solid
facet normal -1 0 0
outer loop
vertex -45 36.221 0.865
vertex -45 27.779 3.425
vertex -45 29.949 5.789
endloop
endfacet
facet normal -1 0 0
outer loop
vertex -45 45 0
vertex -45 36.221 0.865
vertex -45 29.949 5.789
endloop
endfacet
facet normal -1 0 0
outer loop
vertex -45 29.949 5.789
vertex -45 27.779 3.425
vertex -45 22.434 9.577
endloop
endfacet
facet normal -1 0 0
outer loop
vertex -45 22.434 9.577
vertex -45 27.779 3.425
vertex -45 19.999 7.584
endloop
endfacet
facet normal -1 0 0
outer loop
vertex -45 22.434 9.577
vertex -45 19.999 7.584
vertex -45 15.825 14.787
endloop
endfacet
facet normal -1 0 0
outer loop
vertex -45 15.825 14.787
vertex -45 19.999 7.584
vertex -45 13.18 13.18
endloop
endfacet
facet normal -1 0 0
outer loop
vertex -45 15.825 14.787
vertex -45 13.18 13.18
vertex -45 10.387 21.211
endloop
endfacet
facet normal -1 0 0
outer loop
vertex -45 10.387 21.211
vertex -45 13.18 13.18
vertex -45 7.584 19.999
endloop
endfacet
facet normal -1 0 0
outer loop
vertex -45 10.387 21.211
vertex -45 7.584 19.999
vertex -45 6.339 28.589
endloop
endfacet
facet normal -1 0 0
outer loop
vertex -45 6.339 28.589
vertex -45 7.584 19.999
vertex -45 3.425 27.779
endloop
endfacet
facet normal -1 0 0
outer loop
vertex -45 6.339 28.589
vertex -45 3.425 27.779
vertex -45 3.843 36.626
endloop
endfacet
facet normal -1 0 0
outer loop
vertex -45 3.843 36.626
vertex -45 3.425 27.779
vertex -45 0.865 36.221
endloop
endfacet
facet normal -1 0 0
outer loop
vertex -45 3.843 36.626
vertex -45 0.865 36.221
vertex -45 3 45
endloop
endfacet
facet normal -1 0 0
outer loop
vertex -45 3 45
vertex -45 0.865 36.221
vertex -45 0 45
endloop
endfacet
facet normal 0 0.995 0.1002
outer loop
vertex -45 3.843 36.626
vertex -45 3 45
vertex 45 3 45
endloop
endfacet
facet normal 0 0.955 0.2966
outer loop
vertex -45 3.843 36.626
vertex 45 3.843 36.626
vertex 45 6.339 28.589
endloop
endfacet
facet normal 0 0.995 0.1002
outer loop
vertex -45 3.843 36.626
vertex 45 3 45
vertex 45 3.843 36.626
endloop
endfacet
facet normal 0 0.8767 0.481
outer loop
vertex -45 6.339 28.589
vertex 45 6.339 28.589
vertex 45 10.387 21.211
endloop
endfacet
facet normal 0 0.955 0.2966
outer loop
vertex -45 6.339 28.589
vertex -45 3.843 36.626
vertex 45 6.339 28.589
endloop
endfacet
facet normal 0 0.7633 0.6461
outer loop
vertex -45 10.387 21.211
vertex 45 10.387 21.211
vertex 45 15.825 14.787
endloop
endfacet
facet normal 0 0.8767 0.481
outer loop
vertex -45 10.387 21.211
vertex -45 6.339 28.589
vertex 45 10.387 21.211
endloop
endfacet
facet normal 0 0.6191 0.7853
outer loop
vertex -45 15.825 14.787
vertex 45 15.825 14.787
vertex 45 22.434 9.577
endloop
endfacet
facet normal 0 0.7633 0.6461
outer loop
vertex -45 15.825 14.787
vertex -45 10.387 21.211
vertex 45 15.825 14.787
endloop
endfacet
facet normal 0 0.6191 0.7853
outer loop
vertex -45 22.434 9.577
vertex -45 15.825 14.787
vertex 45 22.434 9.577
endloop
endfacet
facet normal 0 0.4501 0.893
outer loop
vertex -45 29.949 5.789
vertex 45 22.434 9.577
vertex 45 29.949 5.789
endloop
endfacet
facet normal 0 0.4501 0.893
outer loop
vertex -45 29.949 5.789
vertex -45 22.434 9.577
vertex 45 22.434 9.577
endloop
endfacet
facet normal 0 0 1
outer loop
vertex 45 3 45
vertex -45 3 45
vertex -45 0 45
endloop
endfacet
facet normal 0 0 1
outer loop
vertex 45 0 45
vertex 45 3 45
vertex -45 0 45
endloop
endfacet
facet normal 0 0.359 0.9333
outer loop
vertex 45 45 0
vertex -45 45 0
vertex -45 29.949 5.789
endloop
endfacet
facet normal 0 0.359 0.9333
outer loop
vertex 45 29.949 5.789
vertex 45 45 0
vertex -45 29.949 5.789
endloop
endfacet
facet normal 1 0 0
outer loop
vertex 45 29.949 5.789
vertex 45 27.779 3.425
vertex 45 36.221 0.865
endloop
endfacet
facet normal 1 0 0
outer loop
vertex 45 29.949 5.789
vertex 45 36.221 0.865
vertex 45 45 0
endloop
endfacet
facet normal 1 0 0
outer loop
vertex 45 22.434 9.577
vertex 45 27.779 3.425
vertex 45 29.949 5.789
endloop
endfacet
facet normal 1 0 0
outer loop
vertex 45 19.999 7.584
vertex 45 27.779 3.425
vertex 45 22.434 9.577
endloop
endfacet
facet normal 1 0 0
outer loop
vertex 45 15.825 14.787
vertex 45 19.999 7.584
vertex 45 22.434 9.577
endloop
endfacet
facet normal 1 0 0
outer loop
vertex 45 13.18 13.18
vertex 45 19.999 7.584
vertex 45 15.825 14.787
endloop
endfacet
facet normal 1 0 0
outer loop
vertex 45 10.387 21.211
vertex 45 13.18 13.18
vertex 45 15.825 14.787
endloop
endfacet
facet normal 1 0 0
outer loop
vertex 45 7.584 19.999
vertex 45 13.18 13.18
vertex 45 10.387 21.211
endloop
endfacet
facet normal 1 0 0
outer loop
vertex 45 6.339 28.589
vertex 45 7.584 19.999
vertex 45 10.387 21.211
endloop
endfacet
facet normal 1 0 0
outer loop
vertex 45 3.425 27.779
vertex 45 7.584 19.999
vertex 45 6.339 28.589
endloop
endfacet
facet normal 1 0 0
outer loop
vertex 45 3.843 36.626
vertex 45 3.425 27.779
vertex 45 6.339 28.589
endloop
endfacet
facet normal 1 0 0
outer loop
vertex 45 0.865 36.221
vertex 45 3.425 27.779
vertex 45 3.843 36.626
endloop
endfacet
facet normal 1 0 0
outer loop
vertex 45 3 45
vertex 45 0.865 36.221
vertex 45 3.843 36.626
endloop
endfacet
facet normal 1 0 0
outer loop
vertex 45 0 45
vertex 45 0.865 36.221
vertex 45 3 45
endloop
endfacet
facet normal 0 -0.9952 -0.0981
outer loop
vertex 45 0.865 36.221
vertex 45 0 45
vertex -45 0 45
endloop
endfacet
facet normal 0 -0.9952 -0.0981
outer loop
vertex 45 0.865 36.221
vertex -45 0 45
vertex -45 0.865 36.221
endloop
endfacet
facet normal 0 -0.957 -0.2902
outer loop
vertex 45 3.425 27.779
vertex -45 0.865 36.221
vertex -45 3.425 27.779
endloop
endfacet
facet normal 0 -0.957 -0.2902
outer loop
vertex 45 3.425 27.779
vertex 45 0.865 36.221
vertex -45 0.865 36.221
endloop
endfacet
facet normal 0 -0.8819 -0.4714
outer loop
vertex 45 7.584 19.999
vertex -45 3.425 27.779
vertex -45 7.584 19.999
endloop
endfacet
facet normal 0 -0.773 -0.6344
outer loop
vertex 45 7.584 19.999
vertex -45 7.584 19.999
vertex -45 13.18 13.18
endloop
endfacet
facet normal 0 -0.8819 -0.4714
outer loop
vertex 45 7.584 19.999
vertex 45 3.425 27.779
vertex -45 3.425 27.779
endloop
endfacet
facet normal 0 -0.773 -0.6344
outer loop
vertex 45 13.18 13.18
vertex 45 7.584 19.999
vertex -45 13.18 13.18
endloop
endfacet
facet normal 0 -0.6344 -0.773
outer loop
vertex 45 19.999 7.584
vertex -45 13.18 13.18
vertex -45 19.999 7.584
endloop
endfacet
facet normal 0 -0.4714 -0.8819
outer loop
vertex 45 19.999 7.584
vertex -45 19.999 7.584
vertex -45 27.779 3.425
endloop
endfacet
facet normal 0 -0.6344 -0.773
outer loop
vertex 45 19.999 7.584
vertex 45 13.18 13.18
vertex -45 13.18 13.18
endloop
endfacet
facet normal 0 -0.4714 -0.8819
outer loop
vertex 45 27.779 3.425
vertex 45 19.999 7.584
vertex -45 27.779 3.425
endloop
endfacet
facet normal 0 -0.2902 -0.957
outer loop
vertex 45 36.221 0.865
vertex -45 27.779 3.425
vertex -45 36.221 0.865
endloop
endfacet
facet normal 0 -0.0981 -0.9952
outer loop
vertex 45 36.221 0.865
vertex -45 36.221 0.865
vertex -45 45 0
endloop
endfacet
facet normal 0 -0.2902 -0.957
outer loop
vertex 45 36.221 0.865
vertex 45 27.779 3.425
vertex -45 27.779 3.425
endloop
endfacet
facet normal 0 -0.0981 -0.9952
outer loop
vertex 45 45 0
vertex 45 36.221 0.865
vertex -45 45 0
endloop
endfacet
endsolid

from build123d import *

# Parameters (mm, degrees)
ESBO_O2_R                  = 45
RESSALTO_EXTRUS_O3_DEPTH   = 45
CORTE_EXTRUS_O1_DEPTH      = 136
CORTE_EXTRUS_O1_DEPTH_BACK = 136
ESBO_O5_R                  = 42
CORTE_EXTRUS_O2_DEPTH      = 136
CORTE_EXTRUS_O2_DEPTH_BACK = 136


with BuildPart() as part:
    # Esboço2 → Ressalto-extrusão3 (new, symmetric)
    with BuildSketch(Plane(origin=(0, 0, 0), x_dir=(0, 0, -1), z_dir=(1, 0, 0))):
        with Locations(Location((-45, 45, 0), (0, 0, 180))):
            Circle(ESBO_O2_R)
    extrude(amount=RESSALTO_EXTRUS_O3_DEPTH, both=True)

    # Esboço5 → Corte-extrusão1 (cut, two sides: drawn at the far end of the back side and taken through both)
    with BuildSketch(Plane(origin=(0, 0, 0), x_dir=(0, 0, -1), z_dir=(1, 0, 0)).offset(-CORTE_EXTRUS_O1_DEPTH_BACK)):
        with Locations((-45, 45)):
            Circle(ESBO_O5_R)
    extrude(amount=CORTE_EXTRUS_O1_DEPTH + CORTE_EXTRUS_O1_DEPTH_BACK, mode=Mode.SUBTRACT)

    # Esboço6 → Corte-extrusão2 (cut, two sides: drawn at the far end of the back side and taken through both)
    with BuildSketch(Plane(origin=(0, 0, 0), x_dir=(0, 0, -1), z_dir=(1, 0, 0)).offset(-CORTE_EXTRUS_O2_DEPTH_BACK)):
        Polygon((-45, 45), (-45, 0), (-90, 0), (-90, 45), (-90, 90), (-45, 90), (-3, 90), (0, 90), (0, 45), (-5.810711404, 29.893721195), align=None)
    extrude(amount=CORTE_EXTRUS_O2_DEPTH + CORTE_EXTRUS_O2_DEPTH_BACK, mode=Mode.SUBTRACT)


solid = part.part
